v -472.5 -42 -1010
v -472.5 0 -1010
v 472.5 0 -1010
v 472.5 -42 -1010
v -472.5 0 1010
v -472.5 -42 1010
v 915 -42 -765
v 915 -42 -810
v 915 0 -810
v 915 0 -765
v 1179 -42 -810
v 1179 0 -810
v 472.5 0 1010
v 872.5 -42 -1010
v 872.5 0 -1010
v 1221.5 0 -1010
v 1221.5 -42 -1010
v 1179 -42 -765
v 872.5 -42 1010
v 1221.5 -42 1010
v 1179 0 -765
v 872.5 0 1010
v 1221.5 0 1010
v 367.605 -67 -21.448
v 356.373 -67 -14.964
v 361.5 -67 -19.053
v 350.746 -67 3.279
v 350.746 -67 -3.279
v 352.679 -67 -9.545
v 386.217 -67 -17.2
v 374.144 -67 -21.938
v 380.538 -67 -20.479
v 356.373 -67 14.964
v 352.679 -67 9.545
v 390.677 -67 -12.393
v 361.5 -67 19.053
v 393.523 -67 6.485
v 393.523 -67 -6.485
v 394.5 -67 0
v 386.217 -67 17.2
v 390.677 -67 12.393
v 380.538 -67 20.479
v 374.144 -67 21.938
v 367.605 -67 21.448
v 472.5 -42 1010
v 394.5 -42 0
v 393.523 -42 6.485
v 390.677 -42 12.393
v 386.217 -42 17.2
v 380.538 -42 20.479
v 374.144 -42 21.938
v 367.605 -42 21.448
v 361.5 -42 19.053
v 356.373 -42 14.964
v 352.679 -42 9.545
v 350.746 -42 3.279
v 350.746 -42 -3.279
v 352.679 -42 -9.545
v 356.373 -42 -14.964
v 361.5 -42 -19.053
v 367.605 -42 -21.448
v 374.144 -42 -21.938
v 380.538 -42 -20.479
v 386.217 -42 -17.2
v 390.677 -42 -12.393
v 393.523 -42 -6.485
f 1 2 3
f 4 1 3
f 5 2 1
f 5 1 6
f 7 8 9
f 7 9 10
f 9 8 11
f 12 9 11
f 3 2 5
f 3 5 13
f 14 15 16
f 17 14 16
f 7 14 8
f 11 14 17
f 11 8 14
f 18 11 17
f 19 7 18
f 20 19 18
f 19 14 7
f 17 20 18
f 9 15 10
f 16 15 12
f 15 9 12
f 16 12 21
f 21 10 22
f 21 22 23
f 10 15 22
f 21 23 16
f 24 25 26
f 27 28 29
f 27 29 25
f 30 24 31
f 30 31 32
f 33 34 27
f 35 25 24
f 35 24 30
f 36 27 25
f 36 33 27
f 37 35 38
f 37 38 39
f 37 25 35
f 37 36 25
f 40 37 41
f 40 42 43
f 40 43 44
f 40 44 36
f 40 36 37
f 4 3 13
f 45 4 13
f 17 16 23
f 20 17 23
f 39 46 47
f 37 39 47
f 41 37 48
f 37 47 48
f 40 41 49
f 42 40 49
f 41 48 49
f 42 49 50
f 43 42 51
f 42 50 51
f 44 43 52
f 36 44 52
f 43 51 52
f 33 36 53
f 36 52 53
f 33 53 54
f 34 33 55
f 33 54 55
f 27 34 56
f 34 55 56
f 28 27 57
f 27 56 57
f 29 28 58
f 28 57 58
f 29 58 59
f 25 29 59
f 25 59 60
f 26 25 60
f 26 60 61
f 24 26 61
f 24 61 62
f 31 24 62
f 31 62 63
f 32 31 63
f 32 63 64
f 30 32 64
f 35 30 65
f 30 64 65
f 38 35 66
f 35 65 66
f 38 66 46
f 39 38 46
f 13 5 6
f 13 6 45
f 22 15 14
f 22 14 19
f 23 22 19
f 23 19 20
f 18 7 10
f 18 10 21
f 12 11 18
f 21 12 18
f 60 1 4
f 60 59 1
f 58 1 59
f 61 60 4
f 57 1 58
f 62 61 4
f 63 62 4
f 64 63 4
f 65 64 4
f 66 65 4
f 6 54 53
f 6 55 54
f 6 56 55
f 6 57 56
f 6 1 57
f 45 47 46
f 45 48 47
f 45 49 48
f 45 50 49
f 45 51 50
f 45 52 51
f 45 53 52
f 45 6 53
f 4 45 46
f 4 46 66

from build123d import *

# Parameters (mm, degrees)
F0_W     = 945
F0_H     = 2020
F1_DEPTH = 42
F2_W     = 349
F2_H     = 2020
F3_DEPTH = 42
F4_W     = 264
F4_H     = 45
F5_DEPTH = 42.001
F6_R     = 22
F7_DEPTH = 25


with BuildPart() as f1:
    # F0 (on Front) → F1 (new body)
    with BuildSketch(Plane.XZ):
        Rectangle(F0_W, F0_H)
    extrude(amount=F1_DEPTH)

    # F6 (on face) → F7 (join)
    with BuildSketch(Plane.XZ.offset(42)):
        with Locations((372.5, 0)):
            Circle(F6_R)
    extrude(amount=F7_DEPTH)


with BuildPart() as f3:
    # F2 (on Front) → F3 (new body)
    with BuildSketch(Plane.XZ):
        with Locations((1047, 0)):
            Rectangle(F2_W, F2_H)
    extrude(amount=F3_DEPTH)

    # F4 (on face) → F5 (cut, through all)
    with BuildSketch(Plane.XZ.offset(42)):
        with Locations((1047, -787.5)):
            Rectangle(F4_W, F4_H)
    extrude(amount=-F5_DEPTH, mode=Mode.SUBTRACT)


solid = Compound([f1.part, f3.part])
